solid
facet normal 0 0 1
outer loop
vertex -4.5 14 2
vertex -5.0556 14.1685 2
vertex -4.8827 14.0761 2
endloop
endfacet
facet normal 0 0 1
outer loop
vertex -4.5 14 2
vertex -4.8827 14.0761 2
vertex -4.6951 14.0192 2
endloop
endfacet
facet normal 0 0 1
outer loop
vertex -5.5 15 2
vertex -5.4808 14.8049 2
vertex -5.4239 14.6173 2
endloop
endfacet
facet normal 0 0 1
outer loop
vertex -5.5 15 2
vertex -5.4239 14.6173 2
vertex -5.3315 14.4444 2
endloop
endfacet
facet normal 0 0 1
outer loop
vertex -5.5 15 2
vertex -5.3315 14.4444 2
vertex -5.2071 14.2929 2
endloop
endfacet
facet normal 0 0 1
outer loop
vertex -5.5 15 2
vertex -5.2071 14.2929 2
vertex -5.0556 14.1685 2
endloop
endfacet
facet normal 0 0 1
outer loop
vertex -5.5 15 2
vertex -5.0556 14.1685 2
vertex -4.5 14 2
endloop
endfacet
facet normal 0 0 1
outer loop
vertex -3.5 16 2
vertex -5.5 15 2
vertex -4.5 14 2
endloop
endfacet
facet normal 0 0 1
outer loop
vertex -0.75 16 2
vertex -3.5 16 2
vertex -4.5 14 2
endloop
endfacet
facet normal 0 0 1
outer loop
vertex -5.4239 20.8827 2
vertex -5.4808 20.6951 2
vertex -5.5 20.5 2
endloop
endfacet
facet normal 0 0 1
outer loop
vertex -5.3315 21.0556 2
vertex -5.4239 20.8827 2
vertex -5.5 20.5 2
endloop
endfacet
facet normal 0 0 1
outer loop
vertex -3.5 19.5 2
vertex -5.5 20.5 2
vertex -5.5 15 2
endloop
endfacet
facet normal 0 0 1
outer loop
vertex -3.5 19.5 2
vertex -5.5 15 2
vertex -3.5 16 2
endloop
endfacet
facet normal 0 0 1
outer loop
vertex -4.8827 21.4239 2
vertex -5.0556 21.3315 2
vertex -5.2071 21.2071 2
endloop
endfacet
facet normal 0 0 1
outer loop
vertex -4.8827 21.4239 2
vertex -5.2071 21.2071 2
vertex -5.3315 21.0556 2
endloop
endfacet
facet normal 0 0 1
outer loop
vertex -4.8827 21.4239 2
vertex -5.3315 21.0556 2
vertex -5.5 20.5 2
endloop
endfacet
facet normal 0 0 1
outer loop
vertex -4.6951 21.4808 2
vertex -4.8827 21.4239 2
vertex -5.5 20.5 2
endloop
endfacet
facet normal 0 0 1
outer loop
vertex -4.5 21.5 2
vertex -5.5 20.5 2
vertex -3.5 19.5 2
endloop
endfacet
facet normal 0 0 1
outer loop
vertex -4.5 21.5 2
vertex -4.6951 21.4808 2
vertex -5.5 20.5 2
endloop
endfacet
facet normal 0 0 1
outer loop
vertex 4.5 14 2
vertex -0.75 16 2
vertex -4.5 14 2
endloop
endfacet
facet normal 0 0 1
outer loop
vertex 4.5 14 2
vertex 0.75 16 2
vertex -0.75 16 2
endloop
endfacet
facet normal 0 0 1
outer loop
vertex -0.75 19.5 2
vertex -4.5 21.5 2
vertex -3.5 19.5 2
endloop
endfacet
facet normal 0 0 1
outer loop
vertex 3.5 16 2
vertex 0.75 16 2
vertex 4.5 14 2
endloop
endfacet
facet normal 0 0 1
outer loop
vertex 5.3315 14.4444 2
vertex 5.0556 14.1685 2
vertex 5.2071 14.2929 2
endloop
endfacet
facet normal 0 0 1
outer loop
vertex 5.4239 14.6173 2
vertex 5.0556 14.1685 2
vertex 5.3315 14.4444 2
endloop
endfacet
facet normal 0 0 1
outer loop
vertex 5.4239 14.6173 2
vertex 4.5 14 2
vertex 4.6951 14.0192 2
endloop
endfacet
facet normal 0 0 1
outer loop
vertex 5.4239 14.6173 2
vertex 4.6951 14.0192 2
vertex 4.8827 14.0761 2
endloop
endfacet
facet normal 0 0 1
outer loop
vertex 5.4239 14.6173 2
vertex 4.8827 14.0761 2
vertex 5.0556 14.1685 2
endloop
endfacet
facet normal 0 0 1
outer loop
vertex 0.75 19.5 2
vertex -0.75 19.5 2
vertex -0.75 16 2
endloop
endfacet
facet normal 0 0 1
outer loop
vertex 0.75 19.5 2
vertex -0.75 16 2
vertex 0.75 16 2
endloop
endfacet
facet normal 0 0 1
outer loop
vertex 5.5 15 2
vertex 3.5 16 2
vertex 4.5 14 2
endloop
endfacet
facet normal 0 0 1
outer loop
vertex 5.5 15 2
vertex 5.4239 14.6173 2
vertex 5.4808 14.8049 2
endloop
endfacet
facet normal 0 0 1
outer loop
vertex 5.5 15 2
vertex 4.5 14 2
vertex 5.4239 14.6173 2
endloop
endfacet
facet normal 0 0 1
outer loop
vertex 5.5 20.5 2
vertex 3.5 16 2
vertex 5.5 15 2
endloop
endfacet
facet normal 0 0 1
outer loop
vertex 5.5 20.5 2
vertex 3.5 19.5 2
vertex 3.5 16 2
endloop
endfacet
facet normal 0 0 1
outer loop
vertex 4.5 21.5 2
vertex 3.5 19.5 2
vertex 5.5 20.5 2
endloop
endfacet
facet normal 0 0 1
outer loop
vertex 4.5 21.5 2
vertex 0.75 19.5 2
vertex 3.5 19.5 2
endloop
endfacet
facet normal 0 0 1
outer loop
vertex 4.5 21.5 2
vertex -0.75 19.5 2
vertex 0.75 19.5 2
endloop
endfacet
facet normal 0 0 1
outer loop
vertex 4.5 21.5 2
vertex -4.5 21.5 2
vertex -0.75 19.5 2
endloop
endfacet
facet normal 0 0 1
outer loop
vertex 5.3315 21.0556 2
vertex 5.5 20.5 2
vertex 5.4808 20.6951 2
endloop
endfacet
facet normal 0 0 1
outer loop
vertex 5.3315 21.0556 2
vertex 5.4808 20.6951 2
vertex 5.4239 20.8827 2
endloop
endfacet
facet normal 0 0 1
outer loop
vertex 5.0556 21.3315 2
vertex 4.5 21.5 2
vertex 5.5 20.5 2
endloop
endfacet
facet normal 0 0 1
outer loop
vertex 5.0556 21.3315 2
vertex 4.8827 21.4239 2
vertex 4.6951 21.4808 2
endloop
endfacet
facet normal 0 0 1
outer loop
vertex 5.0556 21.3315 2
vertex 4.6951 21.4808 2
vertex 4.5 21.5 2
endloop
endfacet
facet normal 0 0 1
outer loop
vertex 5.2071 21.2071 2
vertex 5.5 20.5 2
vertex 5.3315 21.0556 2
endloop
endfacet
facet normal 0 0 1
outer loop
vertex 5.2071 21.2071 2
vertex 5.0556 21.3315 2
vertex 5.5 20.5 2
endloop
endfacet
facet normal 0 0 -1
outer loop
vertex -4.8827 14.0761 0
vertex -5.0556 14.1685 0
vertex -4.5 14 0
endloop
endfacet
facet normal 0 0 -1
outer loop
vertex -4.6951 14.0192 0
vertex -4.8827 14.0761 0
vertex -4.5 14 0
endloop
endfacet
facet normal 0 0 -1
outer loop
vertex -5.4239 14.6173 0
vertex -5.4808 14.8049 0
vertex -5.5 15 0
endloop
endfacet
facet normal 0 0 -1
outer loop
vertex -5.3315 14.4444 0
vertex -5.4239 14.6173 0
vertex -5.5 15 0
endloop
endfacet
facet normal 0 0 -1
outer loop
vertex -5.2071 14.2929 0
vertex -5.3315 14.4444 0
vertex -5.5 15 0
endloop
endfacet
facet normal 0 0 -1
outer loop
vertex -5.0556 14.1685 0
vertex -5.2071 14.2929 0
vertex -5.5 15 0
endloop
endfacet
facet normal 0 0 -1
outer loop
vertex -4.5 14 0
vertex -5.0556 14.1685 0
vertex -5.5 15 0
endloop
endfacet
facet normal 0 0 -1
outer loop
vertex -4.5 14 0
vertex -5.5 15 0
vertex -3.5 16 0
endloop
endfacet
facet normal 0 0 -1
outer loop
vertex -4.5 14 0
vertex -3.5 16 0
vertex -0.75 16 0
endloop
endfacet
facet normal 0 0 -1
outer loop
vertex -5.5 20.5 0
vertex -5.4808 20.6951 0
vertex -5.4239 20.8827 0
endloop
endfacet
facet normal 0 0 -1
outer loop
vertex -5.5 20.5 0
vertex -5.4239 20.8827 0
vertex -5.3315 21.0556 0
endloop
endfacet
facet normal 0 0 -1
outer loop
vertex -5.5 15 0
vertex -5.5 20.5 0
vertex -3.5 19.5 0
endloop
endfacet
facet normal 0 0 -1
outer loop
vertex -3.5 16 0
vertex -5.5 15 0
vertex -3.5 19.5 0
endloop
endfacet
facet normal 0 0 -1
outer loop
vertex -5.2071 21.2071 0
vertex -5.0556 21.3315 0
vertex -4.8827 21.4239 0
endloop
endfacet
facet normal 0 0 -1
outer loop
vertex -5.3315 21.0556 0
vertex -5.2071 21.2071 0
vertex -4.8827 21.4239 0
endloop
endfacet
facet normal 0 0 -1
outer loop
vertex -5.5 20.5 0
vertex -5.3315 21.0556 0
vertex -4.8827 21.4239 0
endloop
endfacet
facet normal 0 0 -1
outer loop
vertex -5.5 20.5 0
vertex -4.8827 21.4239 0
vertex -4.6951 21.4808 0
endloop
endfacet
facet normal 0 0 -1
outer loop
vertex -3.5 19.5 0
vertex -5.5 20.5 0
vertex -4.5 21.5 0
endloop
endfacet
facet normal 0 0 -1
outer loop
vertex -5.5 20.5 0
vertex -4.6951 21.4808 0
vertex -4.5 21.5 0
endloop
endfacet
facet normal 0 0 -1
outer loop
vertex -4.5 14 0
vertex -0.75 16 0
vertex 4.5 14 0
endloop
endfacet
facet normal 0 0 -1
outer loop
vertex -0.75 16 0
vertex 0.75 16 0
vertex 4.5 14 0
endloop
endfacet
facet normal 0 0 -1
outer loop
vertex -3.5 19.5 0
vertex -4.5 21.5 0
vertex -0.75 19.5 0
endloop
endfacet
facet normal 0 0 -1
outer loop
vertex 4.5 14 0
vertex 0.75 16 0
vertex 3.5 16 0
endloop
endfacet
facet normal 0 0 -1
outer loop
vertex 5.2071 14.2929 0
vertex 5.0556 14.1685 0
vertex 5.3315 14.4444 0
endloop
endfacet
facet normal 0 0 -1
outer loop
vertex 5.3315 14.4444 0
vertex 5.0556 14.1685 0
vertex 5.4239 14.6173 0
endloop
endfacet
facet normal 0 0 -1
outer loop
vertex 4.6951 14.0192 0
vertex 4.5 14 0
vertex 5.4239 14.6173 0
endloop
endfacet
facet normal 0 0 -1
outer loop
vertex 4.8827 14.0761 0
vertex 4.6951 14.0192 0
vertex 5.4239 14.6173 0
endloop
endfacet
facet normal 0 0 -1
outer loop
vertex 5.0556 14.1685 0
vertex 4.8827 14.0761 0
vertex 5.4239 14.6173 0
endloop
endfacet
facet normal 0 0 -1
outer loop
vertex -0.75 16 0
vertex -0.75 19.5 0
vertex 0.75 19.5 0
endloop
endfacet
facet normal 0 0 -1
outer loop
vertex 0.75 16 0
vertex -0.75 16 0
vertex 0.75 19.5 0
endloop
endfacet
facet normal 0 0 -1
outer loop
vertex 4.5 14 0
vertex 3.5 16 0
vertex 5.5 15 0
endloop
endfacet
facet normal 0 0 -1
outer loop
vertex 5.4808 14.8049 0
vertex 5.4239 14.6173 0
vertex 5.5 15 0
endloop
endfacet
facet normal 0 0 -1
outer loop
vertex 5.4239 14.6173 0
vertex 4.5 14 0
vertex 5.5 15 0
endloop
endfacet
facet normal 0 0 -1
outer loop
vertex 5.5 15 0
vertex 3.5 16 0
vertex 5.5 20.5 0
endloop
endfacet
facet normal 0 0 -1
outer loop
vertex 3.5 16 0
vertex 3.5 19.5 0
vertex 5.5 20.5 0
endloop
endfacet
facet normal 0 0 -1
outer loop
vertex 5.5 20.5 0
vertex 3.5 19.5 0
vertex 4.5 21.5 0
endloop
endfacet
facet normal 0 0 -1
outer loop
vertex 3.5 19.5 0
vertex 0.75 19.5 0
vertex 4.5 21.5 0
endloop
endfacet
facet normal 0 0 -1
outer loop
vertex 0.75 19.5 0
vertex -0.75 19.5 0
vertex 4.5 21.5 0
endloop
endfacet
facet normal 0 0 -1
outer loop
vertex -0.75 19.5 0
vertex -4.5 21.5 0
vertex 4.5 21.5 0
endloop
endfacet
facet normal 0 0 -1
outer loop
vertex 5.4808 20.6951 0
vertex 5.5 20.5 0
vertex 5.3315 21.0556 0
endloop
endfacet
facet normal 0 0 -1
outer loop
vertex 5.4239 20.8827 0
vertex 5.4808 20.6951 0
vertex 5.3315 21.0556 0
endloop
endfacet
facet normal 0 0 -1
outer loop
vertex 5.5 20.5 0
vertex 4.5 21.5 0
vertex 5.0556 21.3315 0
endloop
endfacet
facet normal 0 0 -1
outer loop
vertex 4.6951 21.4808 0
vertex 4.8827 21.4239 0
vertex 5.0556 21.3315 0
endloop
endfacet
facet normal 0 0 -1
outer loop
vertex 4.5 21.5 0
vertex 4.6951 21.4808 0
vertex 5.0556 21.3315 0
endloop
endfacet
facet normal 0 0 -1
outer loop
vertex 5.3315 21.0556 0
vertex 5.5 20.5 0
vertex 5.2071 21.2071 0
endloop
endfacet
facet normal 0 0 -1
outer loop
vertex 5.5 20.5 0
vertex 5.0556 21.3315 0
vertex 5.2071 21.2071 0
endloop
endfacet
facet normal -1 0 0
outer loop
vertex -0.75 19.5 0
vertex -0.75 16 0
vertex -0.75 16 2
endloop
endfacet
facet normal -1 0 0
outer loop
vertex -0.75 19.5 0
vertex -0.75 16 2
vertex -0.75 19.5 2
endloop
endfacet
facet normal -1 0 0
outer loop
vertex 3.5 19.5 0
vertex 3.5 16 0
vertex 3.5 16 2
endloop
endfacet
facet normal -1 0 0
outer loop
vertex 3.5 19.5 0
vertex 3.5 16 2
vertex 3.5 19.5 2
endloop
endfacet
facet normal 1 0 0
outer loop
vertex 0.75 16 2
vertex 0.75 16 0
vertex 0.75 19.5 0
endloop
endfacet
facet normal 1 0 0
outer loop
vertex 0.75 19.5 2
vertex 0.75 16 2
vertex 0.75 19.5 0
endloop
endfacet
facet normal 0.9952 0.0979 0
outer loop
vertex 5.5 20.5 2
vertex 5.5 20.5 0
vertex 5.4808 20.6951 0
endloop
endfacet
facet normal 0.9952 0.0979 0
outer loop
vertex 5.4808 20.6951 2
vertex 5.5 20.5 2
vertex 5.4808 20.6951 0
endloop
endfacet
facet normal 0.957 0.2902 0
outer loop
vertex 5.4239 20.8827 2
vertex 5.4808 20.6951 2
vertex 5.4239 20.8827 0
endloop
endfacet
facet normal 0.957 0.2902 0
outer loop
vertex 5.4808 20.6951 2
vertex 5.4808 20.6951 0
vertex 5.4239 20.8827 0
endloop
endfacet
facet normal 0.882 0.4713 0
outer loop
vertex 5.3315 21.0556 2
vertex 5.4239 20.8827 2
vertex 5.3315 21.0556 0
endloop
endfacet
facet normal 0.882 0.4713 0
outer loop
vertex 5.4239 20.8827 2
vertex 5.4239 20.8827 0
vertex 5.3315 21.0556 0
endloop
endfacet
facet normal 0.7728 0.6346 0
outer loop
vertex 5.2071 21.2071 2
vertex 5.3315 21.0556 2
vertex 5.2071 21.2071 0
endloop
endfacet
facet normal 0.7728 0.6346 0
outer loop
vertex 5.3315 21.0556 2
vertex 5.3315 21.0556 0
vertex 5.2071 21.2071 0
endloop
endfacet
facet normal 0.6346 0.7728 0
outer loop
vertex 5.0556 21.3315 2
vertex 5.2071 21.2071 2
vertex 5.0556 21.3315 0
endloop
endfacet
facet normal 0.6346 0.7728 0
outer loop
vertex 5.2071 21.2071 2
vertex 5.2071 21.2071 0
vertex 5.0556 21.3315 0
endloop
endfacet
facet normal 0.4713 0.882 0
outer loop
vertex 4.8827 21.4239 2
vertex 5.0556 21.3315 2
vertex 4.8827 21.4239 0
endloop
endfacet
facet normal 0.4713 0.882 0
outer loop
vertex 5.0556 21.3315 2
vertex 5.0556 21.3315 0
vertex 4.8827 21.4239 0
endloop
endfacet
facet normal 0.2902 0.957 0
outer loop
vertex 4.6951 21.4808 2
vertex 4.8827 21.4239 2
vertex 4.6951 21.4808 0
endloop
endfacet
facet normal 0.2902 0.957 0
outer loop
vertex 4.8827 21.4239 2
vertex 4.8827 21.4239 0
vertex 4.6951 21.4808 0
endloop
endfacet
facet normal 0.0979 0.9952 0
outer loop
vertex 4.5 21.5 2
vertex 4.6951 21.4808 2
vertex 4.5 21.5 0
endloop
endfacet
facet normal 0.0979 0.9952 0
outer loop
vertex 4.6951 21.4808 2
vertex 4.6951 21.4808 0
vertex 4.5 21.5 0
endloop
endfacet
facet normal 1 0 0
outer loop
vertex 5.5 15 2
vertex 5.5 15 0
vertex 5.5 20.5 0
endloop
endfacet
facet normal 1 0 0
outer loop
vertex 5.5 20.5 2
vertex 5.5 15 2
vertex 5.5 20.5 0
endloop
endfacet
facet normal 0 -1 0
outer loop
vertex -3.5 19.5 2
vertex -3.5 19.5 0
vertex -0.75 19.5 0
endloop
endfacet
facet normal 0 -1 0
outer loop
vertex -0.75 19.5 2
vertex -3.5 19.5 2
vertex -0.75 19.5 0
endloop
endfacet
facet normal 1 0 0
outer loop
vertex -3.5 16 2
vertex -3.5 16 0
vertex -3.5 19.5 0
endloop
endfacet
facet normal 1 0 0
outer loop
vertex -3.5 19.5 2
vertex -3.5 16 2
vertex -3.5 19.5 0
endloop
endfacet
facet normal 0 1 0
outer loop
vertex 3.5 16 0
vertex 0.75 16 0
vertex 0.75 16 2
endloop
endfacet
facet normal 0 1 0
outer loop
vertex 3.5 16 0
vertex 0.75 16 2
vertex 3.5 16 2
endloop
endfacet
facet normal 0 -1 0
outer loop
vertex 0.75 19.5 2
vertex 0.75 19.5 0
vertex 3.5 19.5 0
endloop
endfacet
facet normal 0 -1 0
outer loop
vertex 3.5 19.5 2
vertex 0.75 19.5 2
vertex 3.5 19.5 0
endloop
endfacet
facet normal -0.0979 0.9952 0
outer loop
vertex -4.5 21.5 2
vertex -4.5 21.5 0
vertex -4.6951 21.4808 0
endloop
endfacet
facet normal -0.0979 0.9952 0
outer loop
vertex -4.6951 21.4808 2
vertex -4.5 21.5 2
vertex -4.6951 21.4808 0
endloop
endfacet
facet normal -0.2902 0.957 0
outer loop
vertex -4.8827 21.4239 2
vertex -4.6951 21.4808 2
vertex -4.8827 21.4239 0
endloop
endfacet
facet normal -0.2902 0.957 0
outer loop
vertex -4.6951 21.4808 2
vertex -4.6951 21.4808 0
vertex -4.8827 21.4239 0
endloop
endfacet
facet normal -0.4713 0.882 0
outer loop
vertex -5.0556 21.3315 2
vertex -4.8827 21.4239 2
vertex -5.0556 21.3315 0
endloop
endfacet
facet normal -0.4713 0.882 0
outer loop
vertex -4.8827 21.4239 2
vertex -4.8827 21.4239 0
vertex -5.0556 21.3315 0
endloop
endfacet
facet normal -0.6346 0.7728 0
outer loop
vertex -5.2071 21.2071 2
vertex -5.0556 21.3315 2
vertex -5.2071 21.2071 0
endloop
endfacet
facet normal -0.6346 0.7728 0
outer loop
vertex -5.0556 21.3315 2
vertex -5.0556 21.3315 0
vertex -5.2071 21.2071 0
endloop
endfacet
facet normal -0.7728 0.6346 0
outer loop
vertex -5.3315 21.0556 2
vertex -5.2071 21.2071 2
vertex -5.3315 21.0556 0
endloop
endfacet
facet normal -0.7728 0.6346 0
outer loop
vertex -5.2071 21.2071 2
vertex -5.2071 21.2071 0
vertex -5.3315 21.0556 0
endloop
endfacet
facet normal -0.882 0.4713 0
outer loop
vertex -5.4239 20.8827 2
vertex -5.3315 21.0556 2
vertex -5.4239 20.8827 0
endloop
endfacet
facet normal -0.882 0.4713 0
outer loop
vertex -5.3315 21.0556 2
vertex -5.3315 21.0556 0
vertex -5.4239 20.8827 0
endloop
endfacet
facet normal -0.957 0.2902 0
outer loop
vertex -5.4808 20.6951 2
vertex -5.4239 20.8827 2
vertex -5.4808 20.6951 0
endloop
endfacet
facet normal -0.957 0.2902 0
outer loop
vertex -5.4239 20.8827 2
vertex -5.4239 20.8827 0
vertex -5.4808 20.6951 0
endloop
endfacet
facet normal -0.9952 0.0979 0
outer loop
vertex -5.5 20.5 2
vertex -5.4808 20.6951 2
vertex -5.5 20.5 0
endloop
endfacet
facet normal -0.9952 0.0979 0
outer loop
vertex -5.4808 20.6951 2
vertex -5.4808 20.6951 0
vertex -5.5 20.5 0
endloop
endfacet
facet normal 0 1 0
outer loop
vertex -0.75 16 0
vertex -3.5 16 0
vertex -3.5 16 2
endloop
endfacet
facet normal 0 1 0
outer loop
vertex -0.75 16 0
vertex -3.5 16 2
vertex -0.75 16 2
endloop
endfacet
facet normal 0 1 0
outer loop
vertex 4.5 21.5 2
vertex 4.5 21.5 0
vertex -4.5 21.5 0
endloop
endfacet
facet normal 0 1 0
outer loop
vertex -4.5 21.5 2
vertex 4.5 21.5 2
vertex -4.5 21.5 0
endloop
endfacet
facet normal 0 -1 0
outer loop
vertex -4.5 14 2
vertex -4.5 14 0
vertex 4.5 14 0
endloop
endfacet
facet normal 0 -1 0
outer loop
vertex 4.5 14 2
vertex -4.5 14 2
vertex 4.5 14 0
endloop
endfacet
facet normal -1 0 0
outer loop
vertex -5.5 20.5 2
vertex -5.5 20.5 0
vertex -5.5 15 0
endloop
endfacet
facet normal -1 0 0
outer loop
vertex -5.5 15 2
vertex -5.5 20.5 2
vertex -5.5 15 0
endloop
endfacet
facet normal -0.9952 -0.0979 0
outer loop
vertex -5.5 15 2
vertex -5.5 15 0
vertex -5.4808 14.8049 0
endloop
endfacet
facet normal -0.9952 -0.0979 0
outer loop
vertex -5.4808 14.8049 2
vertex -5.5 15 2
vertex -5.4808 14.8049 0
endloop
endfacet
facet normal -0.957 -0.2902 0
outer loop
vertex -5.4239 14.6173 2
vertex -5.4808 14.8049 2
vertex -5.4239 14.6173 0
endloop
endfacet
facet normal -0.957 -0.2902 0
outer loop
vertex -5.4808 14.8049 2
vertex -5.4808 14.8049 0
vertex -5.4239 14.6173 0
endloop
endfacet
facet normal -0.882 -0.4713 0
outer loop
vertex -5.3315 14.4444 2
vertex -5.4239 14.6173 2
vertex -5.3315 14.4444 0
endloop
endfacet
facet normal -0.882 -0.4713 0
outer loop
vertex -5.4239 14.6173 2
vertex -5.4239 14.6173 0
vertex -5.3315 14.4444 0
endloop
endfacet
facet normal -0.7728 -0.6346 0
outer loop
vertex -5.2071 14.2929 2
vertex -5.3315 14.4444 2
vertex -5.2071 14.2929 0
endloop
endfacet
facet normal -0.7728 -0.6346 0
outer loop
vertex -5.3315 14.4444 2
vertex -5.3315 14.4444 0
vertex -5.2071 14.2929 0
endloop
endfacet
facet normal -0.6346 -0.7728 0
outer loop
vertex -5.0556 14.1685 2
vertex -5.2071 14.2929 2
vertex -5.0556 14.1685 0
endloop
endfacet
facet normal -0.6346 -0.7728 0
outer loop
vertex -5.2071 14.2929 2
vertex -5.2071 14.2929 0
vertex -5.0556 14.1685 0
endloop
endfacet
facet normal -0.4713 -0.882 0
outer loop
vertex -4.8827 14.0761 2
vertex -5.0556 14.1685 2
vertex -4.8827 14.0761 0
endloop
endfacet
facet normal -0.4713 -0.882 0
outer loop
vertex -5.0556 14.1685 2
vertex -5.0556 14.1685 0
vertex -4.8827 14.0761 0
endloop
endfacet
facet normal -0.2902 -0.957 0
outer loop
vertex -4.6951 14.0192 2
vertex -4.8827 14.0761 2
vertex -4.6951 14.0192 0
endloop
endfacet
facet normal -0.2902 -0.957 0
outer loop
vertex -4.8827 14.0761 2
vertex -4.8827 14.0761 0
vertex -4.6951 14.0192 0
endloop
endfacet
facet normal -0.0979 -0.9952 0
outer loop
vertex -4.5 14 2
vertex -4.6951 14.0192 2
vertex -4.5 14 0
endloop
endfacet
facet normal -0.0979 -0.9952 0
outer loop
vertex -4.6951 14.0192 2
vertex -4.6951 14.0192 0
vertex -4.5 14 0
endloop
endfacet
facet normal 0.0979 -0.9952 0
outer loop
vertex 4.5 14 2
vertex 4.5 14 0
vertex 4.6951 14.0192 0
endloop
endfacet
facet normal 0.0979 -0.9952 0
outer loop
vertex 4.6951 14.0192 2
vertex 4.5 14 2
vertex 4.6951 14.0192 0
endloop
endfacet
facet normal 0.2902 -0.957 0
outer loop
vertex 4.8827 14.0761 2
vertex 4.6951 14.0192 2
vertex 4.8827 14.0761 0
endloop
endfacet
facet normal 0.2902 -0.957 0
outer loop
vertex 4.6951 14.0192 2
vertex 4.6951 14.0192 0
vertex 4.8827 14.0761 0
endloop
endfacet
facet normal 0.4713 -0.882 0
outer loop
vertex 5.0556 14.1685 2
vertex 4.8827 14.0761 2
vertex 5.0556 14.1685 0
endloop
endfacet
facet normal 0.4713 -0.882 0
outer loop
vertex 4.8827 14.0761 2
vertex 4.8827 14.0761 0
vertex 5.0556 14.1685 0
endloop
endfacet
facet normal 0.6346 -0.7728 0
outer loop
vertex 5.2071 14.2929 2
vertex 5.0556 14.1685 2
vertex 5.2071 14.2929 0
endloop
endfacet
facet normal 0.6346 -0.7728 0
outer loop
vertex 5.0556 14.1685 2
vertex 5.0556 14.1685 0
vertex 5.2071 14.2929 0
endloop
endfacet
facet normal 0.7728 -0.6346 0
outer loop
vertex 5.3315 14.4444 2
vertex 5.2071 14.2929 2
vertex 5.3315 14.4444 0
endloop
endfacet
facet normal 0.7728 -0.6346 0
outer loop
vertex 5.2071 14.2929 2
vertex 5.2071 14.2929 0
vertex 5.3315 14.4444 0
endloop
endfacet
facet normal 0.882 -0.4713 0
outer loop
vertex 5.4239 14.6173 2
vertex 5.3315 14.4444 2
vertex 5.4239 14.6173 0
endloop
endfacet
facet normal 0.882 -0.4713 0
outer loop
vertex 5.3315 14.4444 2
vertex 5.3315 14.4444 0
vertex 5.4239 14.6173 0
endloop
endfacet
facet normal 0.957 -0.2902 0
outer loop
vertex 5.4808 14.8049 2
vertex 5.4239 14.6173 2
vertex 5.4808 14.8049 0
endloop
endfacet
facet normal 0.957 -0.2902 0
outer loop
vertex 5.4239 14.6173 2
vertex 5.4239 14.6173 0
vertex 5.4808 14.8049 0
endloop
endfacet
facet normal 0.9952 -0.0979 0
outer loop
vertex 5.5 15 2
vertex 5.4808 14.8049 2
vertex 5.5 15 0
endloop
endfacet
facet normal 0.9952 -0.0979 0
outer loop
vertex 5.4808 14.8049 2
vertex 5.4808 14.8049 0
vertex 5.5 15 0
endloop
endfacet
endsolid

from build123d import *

# Parameters (mm, degrees)
SKETCH1_W           = 2.75
SKETCH1_H           = 3.5
BOSS_EXTRUDE1_DEPTH = 2


with BuildPart() as part:
    # Sketch1 → Boss-Extrude1 (new body)
    with BuildSketch(Plane.XY):
        with BuildLine():
            Line((4.5, 21.5), (-4.5, 21.5))
            ThreePointArc((-4.5, 21.5), (-5.207106781, 21.207106781), (-5.5, 20.5))
            Line((-5.5, 20.5), (-5.5, 15))
            ThreePointArc((-5.5, 15), (-5.207106781, 14.292893219), (-4.5, 14))
            Line((-4.5, 14), (4.5, 14))
            ThreePointArc((4.5, 14), (5.207106781, 14.292893219), (5.5, 15))
            Line((5.5, 15), (5.5, 20.5))
            ThreePointArc((5.5, 20.5), (5.207106781, 21.207106781), (4.5, 21.5))
        make_face()
        with Locations((2.125, 17.75)):
            Rectangle(SKETCH1_W, SKETCH1_H, mode=Mode.SUBTRACT)
        with Locations((-2.125, 17.75)):
            Rectangle(SKETCH1_W, SKETCH1_H, mode=Mode.SUBTRACT)
    extrude(amount=BOSS_EXTRUDE1_DEPTH)


solid = part.part
